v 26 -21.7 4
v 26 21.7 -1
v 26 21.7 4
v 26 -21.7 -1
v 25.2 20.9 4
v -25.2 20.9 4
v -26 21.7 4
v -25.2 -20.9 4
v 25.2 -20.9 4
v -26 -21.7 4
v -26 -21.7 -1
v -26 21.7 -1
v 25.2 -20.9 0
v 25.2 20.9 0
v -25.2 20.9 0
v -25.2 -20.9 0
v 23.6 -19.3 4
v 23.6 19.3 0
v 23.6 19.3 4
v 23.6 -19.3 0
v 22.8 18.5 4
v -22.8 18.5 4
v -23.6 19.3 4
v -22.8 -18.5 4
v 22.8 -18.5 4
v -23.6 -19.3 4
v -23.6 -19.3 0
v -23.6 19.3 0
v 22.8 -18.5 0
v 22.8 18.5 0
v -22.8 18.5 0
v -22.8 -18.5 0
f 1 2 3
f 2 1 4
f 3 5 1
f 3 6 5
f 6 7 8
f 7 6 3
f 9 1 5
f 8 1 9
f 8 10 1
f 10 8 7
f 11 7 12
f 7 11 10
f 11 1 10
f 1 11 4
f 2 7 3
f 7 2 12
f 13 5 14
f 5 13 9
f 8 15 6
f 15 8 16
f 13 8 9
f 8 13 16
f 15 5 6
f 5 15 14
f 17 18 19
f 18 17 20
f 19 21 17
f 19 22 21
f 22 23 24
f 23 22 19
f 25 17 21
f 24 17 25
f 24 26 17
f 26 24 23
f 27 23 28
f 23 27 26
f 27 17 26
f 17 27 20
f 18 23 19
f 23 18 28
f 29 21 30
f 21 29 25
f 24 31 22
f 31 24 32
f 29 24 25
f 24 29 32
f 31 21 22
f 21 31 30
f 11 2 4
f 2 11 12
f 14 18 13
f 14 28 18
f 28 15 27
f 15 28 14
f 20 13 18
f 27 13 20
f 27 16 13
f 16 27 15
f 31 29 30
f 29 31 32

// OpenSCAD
/*

A box for holding lots of little glass or silicon samples, 10-20mm square and 1-3mm thick.
Most of the solutions for this I've seen either require the bits to be an exact size, or
they lay them flat which is bad (partly because the flat surfaces touch the top/bottom
and partly because they're hard to insert/remove).

This box packs them closer, but avoids these problems by using curved surfaces - so the little bits of glass can't get stuck.

(c) Richard Bowman 2016, released under CERN Open Hardware License.

*/

use <utilities.scad>;
d = 0.05;
$fn = 64;

unit_padding = [1,2,0]; //extra space around each sample
holder_padding = [0.5,1,1]; //extra material at the edges of the sample holders
box_space = [4,0,2]; //spacing between sample holders in the box to allow for extractor tool
box_wall = [2,2,1]; //thickness of the outer box wall
holder_clearance = 0.7; //extra space around sample holder
lid_clearance = 0.4; //extra space between box and lid
lid_lip = 4; //height of the lip around the lid
lid_t = [1.4,1.4,1]; //thickness of lid

// this calculates the size needed per sample
function diag(vec) = [[vec[0],0,0],[0,vec[1],0],[0,0,vec[2]]];
function unit_size(sample) = sample + [sample[1],0,0] + unit_padding;
function holder_size(N, sample) = unit_size(sample) * diag([1,N,1]) + holder_padding * 2 - [0,0,holder_padding[2]+lid_lip];

module sample_cutout(sample=[15, 1, 19]){
    intersection(){
        //crop to one unit
        translate([0,0,(sample + unit_padding)[2]/2]) 
            cube(sample+[sample[1],0,0]+unit_padding+[d,d,d], center=true); 
        
        hull(){
            reflect([1,0,0]) translate([-sample[0]/2,0,0]){
                cylinder(d=sample[1], h=sample[2], $fn=8);
                reflect([0,1,0]) rotate(30) cube([sample[0]/2, sample[1]/2, sample[2]]);
            }
        }
    }
}

module sample_holder(N, sample){
    //A small box for holding a number of glass samples.
    //There's fittings at either end for a handle with which the samples can be manipulated.
    //The bottom is open to allow drainage of solvents.
    unit = unit_size(sample);
    body = holder_size(N, sample);
    difference(){
        translate([0,0,body[2]/2-holder_padding[2]]) cube(body, center=true);
        
        //the samples
        repeat([0,unit[1],0], N, center=true) sample_cutout(sample+[0,0,1]);
        
        //drainage slot
        cube([unit[0]-8, unit[1]*N, 999],center=true);
    }
}

module sample_holder_box(N=[2,12], sample=[15,1,19]){
    // A sample box for holding lots of small bits of glass
    holder = holder_size(N[1], sample);
    void = holder * diag([N[0], 1, 1]) + diag([N[0]+1,0,1]) * box_space + [0,2,0] * holder_clearance + [0,0,lid_lip];
    body = void + diag([2,2,1]) * box_wall;
    lid_t = box_wall/2 + [1,1,1]*lid_clearance/2; //how much space to allow for the lid
    difference(){
        union(){
            translate([0,0,(body[2]-lid_lip-box_wall[0]-box_space[0])/2]) cube(body - [0,0,lid_lip], center=true);
            translate([0,0,(body[2]-box_wall[0]-box_space[0])/2]) cube(body - lid_t*diag([2,2,0]), center=true);
        }
        
        //cutouts for sample holders
        repeat([holder[0]+box_space[0],0,0], N[0], center=true) 
            translate(-diag(holder)*[1,1,0]/2-[1,1,0]*holder_clearance) cube(holder + [2,2,999]*holder_clearance);
        
        //cutout for tongs
        translate([0,0,void[2]/2-box_space[2]]) cube(void - [0,8,0], center=true);
        
        //cutout for inner lip of lid
        translate([0,0,void[2]/2 + holder[2]]) cube(void, center=true);
    }
}

module sample_box_lid(N=[2,12], sample=[15,1,19]){
    // A lid for the above sample box
    holder = holder_size(N[1], sample);
    void = holder * diag([N[0], 1, 1]) + diag([N[0]+1,0,1]) * box_space + [0,2,0] * holder_clearance + [0,0,lid_lip];
    body = void + diag([2,2,1]) * box_wall;
    lid_t = box_wall/2 - [1,1,1]*lid_clearance/2; //how much space to allow for the lid
    clearance = 0.4;
    union(){
        translate([0,0,box_wall[2]/2]) cube(diag([1,1,0]) * body + [0,0,box_wall[2]], center=true); //flat top
        
        for(outer=[body, void - [2,2,0]*lid_clearance]) difference(){
            translate([0,0,-lid_lip/2+d]) cube(diag([1,1,0]) * outer + [0,0,lid_lip+2*d], center=true);
            cube(diag([1,1,0]) * (outer - 2*lid_t) + [0,0,999], center=true);
        }
    }
}

//sample_cutout();

N=[2,12];
sample = [15.5,1.5,18];

//sample_holder(N[1], sample);
//sample_holder_box(N, sample);
rotate([180,0,0]) 
//translate([40,0,0]) 
sample_box_lid(N);
